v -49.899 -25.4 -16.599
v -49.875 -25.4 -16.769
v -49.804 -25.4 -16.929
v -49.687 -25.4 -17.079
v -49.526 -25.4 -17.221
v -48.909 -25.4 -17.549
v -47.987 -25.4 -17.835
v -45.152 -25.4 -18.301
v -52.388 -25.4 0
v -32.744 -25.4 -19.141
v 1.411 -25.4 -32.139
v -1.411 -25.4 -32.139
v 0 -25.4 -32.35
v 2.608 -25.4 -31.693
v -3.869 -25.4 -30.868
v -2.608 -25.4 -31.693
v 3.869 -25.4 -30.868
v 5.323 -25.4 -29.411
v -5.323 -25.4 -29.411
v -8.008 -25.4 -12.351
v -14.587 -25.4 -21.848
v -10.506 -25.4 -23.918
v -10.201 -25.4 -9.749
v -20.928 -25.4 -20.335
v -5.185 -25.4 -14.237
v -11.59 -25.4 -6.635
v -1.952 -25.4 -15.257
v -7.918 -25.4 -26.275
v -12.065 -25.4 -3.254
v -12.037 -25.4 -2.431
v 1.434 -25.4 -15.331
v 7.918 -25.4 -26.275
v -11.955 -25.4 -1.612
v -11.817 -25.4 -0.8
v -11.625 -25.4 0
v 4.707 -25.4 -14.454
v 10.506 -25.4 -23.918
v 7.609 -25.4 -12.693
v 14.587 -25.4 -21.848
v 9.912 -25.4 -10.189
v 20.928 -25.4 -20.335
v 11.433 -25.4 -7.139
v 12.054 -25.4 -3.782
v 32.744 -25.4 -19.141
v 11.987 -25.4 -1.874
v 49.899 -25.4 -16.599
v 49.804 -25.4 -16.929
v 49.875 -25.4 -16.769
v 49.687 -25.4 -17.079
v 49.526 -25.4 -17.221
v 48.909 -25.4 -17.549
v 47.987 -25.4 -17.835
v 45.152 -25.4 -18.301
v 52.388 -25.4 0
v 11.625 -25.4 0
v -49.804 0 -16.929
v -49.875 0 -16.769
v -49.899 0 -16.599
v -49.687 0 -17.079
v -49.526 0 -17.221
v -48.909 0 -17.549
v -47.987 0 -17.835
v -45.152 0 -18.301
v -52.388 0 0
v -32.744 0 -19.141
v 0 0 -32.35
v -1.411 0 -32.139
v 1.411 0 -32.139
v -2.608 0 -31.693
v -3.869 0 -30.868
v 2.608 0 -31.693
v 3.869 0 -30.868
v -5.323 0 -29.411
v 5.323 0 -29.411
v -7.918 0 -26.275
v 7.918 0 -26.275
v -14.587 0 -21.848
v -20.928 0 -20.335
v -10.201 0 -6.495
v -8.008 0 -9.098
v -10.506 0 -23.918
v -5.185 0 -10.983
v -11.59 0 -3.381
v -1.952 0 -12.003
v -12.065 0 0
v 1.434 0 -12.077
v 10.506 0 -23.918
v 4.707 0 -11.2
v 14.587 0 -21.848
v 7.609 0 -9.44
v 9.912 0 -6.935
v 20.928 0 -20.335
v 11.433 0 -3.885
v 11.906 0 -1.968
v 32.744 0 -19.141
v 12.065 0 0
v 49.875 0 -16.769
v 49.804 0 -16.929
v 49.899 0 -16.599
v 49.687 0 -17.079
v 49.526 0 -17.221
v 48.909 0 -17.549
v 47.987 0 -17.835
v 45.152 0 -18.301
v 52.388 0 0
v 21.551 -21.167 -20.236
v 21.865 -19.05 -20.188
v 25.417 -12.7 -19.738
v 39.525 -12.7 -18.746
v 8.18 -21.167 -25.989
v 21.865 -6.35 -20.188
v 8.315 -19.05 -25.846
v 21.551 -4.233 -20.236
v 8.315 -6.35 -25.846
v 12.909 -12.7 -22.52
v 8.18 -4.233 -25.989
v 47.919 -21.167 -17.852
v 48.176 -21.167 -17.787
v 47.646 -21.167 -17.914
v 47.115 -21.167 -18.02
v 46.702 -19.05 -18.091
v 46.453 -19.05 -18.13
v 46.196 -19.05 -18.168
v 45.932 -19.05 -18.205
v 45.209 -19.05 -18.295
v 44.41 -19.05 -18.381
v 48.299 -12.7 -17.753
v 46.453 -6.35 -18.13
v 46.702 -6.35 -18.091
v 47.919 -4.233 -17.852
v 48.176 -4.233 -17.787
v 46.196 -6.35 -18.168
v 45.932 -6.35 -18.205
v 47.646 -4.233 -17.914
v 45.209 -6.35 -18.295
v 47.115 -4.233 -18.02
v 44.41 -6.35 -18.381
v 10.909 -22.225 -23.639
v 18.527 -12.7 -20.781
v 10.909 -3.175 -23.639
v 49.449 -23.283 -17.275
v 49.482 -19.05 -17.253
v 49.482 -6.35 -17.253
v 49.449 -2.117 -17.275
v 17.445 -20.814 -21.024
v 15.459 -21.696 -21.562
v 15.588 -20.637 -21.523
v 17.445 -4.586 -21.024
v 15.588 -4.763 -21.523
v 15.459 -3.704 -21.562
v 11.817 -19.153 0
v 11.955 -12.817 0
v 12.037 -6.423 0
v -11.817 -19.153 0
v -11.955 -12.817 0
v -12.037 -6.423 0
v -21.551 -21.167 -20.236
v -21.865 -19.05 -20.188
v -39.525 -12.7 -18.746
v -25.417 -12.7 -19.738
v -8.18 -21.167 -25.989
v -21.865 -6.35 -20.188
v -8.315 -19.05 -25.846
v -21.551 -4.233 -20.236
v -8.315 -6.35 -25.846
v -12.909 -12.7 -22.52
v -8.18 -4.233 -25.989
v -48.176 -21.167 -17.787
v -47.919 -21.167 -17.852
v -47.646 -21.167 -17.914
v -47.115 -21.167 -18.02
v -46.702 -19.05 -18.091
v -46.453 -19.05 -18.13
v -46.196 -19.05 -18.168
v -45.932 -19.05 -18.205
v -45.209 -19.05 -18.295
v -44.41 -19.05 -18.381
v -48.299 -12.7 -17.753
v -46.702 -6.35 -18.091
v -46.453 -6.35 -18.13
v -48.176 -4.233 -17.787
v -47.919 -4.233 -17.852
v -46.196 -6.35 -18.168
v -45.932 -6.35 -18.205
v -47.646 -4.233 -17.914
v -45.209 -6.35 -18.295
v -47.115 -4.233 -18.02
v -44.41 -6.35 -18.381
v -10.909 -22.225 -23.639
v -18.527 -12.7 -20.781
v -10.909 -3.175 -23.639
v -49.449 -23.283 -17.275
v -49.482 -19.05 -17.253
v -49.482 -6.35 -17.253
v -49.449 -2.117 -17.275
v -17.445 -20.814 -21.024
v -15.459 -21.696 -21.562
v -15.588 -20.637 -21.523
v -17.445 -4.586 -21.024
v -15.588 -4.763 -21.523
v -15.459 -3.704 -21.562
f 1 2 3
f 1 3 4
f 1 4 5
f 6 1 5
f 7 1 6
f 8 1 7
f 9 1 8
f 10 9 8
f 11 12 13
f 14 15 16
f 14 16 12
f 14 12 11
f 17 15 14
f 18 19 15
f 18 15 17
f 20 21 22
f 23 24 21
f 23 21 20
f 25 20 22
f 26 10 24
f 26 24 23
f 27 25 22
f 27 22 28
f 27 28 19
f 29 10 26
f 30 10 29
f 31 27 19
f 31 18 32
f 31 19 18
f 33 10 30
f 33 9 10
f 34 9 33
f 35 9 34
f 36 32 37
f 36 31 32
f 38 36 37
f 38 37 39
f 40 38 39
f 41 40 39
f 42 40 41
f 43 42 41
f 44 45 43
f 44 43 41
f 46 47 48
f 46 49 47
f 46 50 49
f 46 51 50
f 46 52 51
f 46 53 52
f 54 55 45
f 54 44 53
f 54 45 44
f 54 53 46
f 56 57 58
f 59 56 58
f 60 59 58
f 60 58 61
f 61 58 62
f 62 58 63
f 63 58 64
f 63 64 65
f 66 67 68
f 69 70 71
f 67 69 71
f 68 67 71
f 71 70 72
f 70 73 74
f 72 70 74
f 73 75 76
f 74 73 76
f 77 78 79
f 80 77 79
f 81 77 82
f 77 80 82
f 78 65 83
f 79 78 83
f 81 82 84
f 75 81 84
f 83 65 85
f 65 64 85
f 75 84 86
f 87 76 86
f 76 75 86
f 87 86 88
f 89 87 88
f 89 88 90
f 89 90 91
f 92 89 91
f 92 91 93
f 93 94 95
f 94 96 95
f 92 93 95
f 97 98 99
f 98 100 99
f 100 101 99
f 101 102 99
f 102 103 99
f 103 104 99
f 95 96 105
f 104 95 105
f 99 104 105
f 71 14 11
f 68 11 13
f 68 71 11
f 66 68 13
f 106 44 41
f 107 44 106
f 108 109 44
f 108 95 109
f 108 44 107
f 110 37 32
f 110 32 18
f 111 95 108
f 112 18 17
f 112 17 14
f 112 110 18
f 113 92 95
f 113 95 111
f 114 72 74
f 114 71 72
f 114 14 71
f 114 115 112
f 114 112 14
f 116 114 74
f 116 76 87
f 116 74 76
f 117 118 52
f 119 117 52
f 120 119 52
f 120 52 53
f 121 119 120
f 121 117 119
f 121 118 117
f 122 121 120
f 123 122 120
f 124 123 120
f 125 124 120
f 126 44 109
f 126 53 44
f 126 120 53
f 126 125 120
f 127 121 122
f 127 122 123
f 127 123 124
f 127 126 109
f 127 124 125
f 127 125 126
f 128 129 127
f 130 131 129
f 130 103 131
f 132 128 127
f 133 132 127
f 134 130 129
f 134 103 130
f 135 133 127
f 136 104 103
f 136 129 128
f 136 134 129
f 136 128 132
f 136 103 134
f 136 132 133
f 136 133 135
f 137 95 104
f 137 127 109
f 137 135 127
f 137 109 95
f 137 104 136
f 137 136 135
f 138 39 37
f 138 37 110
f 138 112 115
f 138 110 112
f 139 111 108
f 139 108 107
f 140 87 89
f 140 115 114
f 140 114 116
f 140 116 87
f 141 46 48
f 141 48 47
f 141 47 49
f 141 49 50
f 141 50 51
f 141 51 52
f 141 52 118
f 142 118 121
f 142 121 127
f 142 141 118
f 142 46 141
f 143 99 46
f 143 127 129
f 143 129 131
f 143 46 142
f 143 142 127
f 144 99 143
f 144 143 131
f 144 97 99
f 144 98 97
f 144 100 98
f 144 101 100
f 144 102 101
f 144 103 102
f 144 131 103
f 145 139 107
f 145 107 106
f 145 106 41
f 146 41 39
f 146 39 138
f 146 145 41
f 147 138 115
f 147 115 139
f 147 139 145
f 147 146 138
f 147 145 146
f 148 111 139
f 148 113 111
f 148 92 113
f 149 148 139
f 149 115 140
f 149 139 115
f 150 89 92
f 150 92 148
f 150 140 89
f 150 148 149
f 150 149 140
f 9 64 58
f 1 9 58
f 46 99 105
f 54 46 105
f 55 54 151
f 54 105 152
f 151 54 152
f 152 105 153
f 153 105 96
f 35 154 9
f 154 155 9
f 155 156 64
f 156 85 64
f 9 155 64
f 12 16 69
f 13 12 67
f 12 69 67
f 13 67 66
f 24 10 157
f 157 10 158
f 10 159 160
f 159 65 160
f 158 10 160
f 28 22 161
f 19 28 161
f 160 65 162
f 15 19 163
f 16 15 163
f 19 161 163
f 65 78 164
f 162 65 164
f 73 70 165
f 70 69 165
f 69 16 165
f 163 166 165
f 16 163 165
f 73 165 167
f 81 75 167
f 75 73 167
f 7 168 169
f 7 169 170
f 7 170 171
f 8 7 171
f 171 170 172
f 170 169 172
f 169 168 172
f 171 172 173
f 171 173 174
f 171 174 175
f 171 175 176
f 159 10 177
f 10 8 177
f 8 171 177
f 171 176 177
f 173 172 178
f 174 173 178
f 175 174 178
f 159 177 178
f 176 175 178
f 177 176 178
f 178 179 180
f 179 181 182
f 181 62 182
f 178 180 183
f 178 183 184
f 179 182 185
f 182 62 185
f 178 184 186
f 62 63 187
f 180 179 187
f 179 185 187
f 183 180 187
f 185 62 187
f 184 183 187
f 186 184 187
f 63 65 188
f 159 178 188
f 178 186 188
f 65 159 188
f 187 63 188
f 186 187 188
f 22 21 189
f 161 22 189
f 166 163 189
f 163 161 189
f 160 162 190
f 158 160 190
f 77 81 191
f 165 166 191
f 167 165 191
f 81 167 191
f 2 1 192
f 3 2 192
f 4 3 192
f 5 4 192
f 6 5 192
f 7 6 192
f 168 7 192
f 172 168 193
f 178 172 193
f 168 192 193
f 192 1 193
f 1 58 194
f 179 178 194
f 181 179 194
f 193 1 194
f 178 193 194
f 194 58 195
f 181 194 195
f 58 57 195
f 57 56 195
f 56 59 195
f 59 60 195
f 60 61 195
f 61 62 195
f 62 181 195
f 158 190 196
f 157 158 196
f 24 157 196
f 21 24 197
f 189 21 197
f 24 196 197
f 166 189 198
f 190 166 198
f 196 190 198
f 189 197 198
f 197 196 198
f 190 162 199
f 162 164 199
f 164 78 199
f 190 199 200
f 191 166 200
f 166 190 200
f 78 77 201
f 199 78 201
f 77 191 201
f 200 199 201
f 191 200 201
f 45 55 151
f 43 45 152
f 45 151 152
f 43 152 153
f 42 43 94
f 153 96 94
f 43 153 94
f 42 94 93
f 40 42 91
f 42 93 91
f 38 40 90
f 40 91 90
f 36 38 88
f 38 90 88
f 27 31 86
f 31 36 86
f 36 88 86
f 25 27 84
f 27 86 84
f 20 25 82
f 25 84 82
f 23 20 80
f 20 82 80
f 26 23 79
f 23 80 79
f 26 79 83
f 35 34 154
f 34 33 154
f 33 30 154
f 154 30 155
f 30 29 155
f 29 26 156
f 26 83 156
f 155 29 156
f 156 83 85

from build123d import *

# Parameters (mm, degrees)
F1_DEPTH = 25.4
F3_R     = 12.065
F4_DEPTH = 76.2


with BuildPart() as f1:
    # F0 (on Front) → F1 (new body)
    with BuildSketch(Plane.XZ):
        with BuildLine():
            Line((52.3875, 0), (-52.3875, 0))
            Line((-52.3875, 0), (-49.8988601972, -16.5985570235))
            add(Edge.make_bspline(
                [(-49.8988601972, -16.5985570235), (-49.8988601972, -19.9378890599), (-6.0647983403, -16.1415340845), (-5.8959199742, -32.0347056309), (0, -32.349884783)],
                knots=[0, 0, 0, 0, 0.6030923859, 1, 1, 1, 1], degree=3))
            add(Edge.make_bspline(
                [(49.8988601972, -16.5985570235), (49.8988601972, -19.9378890599), (6.0647983403, -16.1415340845), (5.8959199742, -32.0347056309), (0, -32.349884783)],
                knots=[0, 0, 0, 0, 0.6030923859, 1, 1, 1, 1], degree=3))
            Line((49.8988601972, -16.5985570235), (52.3875, 0))
        make_face()
    extrude(amount=F1_DEPTH)

    # F3 (on face) → F4 (cut)
    with BuildSketch(Plane(origin=(0, 0, 0), x_dir=(-1, 0, 0), z_dir=(0, 0.9918944426, 0.1270646086))):
        Circle(F3_R)
    extrude(amount=-F4_DEPTH, mode=Mode.SUBTRACT)


solid = f1.part
